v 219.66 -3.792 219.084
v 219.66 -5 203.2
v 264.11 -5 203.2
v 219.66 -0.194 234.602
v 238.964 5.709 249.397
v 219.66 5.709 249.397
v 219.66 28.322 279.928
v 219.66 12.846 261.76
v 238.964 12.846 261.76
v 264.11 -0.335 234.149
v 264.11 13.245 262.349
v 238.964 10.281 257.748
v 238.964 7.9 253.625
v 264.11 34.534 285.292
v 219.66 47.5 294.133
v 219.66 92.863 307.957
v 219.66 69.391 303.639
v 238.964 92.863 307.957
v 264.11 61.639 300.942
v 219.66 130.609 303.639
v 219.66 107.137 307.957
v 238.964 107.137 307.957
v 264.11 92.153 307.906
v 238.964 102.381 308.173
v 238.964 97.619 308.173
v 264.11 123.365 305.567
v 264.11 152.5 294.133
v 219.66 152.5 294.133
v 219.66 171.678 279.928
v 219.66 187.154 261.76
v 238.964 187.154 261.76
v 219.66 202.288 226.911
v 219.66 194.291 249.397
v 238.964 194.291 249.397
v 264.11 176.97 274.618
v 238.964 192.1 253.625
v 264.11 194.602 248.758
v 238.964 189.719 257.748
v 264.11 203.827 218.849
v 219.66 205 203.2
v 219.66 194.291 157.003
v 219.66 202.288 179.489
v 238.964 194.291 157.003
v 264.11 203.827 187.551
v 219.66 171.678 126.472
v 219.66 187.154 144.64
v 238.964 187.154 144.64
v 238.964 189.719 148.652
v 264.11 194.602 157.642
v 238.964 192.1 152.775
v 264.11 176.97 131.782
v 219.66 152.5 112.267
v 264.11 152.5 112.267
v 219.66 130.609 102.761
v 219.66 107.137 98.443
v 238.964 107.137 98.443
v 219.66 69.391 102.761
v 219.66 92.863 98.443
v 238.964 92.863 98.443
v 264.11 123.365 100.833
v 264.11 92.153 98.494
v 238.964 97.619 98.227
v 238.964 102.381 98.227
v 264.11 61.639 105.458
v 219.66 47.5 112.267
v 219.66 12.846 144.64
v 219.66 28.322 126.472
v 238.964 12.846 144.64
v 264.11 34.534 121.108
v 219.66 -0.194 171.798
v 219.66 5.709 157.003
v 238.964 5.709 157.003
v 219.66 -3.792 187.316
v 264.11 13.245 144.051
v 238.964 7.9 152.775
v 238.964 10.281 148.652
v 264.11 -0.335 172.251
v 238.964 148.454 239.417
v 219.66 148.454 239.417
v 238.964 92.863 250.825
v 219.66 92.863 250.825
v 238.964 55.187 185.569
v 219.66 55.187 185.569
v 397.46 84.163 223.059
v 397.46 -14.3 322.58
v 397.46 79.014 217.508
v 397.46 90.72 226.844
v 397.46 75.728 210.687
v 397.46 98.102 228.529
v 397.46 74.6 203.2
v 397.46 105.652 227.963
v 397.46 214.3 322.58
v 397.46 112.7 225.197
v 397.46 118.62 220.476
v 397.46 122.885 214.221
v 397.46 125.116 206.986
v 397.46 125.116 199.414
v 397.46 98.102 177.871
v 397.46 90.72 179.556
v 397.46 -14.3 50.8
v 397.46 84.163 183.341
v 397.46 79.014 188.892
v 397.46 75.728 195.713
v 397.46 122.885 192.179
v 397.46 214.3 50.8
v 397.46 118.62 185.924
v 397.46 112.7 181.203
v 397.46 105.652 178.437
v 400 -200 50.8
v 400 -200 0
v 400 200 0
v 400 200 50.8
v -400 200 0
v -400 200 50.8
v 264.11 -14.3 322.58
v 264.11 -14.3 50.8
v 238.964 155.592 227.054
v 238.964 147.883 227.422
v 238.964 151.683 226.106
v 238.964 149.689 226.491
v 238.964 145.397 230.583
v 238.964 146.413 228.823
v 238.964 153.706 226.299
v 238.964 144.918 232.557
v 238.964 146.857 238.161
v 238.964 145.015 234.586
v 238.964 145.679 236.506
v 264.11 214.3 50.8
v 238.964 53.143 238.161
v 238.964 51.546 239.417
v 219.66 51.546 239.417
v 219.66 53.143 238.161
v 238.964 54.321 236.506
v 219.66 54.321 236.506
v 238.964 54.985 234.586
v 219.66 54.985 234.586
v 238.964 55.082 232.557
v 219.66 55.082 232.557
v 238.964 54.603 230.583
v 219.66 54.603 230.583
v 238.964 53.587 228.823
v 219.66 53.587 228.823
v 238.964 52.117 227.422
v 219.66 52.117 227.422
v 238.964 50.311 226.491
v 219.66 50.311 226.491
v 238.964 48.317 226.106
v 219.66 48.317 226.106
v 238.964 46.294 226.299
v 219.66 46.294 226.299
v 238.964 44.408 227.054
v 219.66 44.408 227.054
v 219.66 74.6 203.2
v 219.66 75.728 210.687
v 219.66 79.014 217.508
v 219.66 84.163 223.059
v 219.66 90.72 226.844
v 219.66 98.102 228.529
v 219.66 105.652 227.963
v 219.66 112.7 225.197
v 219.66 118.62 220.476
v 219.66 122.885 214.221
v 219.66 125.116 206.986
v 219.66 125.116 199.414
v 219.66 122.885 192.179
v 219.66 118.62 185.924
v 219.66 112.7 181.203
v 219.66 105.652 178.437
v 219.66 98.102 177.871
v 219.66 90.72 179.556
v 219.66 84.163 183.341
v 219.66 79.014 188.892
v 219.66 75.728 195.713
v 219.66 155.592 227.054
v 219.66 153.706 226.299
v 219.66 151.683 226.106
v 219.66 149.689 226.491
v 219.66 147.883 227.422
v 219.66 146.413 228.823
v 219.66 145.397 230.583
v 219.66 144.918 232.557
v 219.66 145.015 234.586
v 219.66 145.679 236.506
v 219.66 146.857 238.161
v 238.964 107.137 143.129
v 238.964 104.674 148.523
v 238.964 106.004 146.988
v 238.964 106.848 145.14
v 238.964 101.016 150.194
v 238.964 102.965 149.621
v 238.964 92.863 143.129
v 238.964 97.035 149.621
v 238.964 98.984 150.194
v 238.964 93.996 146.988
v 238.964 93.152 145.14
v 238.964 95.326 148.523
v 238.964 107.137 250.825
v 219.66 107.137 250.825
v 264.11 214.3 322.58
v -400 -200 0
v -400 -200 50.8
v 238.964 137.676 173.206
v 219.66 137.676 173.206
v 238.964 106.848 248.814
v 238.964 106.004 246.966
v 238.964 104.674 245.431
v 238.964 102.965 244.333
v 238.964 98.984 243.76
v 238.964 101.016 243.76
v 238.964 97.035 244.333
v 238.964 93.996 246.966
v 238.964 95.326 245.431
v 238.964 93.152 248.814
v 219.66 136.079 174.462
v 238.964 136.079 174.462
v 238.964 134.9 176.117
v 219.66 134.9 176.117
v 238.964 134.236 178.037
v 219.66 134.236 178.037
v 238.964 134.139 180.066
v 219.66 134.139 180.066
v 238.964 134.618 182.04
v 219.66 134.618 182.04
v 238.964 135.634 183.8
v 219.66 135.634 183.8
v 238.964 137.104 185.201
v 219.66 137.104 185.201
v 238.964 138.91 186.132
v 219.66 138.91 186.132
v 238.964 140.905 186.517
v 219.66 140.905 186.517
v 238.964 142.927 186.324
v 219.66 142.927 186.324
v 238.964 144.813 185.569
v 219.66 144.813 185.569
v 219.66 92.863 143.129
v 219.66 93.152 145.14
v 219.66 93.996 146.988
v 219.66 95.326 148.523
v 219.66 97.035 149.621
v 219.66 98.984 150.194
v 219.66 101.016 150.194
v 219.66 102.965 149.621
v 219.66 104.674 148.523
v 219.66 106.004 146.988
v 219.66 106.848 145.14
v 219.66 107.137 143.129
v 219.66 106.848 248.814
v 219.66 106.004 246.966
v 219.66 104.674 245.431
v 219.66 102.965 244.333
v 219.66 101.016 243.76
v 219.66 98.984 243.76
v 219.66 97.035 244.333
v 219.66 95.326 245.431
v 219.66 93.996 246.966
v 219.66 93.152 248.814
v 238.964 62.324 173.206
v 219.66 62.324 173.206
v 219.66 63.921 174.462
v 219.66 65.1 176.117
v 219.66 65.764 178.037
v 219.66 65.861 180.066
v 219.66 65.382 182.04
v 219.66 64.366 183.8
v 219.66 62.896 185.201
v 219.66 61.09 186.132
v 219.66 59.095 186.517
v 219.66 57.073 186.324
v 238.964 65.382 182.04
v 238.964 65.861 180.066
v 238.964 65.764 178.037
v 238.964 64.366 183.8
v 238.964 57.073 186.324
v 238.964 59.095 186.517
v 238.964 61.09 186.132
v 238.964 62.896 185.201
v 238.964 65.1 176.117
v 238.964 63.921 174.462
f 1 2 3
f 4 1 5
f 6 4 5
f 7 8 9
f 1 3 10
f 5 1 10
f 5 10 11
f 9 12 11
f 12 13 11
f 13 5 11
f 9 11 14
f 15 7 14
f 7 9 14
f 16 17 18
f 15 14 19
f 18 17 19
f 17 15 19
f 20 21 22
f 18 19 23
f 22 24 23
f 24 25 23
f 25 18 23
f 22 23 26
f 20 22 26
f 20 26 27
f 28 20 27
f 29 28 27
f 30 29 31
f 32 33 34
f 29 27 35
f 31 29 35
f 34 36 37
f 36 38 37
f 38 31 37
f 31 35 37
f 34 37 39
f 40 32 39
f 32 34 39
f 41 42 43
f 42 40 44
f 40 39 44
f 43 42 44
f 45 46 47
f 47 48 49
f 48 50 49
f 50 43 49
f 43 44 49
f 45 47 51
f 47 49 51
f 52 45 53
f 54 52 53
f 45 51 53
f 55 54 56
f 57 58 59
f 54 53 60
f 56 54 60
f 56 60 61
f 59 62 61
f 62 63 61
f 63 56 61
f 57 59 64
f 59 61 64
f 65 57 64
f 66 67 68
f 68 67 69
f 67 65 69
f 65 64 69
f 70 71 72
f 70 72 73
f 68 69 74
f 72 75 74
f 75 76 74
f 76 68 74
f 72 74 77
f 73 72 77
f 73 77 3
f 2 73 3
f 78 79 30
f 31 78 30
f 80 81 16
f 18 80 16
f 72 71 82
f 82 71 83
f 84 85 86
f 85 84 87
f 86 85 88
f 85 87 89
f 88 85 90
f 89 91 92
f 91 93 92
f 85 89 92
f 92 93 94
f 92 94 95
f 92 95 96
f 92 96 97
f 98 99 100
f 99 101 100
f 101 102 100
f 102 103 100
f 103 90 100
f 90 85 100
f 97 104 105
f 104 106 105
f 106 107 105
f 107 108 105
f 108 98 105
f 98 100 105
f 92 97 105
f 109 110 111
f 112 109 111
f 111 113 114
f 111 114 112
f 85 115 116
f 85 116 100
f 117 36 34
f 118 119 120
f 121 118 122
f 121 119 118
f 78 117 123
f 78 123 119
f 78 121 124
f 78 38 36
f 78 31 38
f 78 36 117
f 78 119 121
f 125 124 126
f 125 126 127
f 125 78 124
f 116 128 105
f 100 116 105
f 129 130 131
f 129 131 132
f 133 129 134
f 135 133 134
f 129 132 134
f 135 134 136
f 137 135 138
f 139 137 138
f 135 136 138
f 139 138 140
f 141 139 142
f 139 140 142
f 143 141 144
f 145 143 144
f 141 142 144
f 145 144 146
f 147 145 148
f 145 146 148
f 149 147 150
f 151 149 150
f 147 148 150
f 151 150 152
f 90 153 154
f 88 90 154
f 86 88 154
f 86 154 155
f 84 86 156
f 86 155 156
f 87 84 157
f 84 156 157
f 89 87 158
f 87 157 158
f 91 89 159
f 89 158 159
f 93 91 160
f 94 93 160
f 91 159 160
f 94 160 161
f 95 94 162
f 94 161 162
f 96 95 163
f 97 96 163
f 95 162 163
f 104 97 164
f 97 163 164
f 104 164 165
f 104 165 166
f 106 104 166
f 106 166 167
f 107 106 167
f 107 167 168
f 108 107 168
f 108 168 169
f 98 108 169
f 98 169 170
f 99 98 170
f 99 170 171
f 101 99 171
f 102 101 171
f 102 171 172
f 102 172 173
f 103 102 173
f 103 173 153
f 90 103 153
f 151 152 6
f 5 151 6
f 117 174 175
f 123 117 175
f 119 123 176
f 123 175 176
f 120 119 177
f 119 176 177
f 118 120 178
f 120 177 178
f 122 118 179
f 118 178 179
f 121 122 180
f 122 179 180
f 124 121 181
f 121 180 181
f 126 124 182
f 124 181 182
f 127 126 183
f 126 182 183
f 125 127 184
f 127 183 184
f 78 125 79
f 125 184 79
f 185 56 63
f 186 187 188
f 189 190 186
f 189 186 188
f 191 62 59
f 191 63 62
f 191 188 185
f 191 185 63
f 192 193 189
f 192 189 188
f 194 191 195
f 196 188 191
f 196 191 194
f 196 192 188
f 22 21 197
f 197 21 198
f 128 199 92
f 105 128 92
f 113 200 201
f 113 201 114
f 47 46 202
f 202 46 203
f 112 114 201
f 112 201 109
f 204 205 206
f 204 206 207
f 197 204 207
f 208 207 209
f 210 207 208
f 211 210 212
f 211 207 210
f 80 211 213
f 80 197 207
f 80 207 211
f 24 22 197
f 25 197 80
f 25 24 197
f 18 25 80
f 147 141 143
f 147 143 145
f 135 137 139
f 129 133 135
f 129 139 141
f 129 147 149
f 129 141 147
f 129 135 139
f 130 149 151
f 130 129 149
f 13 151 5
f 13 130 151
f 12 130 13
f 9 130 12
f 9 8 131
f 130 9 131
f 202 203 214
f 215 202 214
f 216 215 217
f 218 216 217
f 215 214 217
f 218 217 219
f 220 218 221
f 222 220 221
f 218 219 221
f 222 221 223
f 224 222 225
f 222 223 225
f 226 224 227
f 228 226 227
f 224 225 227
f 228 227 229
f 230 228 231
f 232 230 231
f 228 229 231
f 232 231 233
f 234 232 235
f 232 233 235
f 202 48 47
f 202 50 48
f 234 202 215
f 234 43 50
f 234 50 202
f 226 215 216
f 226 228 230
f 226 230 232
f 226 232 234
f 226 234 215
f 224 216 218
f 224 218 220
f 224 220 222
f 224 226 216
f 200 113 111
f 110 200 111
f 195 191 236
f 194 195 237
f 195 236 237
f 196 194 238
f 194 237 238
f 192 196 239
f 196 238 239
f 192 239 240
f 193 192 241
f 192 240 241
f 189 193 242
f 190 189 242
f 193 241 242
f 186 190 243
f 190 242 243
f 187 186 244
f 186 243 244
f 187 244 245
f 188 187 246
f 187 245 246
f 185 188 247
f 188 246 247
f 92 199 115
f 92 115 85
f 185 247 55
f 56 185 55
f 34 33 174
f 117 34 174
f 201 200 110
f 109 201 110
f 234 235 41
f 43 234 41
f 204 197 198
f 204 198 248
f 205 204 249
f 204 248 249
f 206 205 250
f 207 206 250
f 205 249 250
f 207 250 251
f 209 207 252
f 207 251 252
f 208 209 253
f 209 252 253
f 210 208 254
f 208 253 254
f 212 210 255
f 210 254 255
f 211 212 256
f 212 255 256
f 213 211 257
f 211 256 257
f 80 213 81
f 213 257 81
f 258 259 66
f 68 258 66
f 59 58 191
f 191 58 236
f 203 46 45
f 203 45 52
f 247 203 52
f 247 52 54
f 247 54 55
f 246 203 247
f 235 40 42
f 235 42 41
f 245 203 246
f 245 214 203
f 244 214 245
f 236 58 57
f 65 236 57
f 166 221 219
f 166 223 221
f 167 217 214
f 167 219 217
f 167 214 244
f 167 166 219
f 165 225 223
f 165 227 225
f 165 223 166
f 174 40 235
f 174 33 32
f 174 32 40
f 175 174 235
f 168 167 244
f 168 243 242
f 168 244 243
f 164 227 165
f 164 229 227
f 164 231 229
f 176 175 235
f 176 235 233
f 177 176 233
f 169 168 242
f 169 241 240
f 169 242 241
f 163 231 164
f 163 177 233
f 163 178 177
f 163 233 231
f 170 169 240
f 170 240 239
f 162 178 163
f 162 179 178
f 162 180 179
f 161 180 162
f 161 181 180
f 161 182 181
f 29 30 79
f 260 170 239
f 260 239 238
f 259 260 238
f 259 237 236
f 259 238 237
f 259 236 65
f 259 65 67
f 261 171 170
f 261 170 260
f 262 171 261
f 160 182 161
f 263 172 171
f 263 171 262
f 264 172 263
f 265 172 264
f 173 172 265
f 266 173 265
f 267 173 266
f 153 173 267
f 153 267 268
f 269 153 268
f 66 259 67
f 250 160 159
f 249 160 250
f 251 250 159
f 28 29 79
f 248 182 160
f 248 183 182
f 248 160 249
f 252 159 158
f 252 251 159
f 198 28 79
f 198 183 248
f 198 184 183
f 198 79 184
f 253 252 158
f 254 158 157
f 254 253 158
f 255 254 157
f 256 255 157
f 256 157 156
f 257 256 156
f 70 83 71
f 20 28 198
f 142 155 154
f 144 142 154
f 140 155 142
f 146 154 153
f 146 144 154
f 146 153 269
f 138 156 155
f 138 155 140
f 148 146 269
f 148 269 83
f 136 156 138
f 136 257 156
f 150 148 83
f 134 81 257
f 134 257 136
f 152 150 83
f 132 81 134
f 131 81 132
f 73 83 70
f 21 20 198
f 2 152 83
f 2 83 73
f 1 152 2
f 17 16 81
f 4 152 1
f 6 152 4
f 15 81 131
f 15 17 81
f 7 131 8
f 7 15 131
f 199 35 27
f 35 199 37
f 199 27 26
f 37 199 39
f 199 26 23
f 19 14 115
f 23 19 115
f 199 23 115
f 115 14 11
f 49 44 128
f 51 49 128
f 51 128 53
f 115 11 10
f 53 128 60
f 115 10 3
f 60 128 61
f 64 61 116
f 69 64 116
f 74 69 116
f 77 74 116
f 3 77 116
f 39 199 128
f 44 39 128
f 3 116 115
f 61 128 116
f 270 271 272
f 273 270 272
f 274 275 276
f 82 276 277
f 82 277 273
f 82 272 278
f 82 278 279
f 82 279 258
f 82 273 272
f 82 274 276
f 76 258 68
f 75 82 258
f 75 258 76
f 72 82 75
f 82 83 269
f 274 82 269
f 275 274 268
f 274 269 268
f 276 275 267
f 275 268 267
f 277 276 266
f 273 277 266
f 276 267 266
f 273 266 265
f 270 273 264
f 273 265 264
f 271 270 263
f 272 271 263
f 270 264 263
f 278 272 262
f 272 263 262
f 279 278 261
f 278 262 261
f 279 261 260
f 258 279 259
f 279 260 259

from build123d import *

# Parameters (mm, degrees)
F0_W     = 800
F0_H     = 400
F1_DEPTH = 50.8
F2_W     = 133.35
F2_H     = 14.3
F2_H_2   = 214.3
F3_DEPTH = 271.78
F4_R     = 105
F5_DEPTH = 44.45
F7_DEPTH = 19.304
F8_R     = 25.4
F9_DEPTH = 180.341


with BuildPart() as f1:
    # F0 (on Top) → F1 (new body)
    with BuildSketch(Plane.XY):
        Rectangle(F0_W, F0_H)
    extrude(amount=F1_DEPTH)


with BuildPart() as f3:
    # F2 (on face) → F3 (new body)
    with BuildSketch(Plane.XY.offset(50.8)):
        with Locations((330.785, 207.15)):
            Rectangle(F2_W, F2_H)
        with Locations((330.785, 92.85)):
            Rectangle(F2_W, F2_H_2)
    extrude(amount=F3_DEPTH)

    # F4 (on face) → F5 (join)
    with BuildSketch(Plane(origin=(264.11, 0, 0), x_dir=(0, -1, 0), z_dir=(-1, 0, 0))):
        with Locations((-100, 203.2)):
            Circle(F4_R)
    extrude(amount=F5_DEPTH)

    # F6 (on face) → F7 (cut)
    with BuildSketch(Plane(origin=(219.66, 0, 0), x_dir=(0, -1, 0), z_dir=(-1, 0, 0))):
        with BuildLine():
            Line((-107.1374, 308.2), (-107.1374, 250.825))
            ThreePointArc((-107.1374, 250.825), (-100, 243.6876), (-92.8626, 250.825))
            Line((-92.8626, 250.825), (-92.8626, 308.2))
            ThreePointArc((-92.8626, 308.2), (-100, 315.3374), (-107.1374, 308.2))
        make_face()
        with BuildLine():
            Line((-92.8626, 98.2), (-92.8626, 143.129))
            ThreePointArc((-92.8626, 143.129), (-100, 150.2664), (-107.1374, 143.129))
            Line((-107.1374, 143.129), (-107.1374, 98.2))
            ThreePointArc((-107.1374, 98.2), (-100, 91.0626), (-92.8626, 98.2))
        make_face()
        with BuildLine():
            ThreePointArc((-137.67576, 173.20633), (-135.06329, 182.9562), (-144.81316, 185.56867))
            Line((-144.81316, 185.56867), (-194.501367, 156.88117))
            ThreePointArc((-194.501367, 156.88117), (-197.113837, 147.1313), (-187.363967, 144.51883))
            Line((-187.363967, 144.51883), (-137.67576, 173.20633))
        make_face()
        with BuildLine():
            ThreePointArc((-55.18684, 185.56867), (-64.93671, 182.9562), (-62.32424, 173.20633))
            Line((-62.32424, 173.20633), (-12.636033, 144.51883))
            ThreePointArc((-12.636033, 144.51883), (-2.886163, 147.1313), (-5.498633, 156.88117))
            Line((-5.498633, 156.88117), (-55.18684, 185.56867))
        make_face()
        with BuildLine():
            ThreePointArc((-51.545688, 239.41667), (-54.158158, 229.6668), (-44.408288, 227.05433))
            Line((-44.408288, 227.05433), (-5.498633, 249.51883))
            ThreePointArc((-5.498633, 249.51883), (-2.886163, 259.2687), (-12.636033, 261.88117))
            Line((-12.636033, 261.88117), (-51.545688, 239.41667))
        make_face()
        with BuildLine():
            ThreePointArc((-155.591712, 227.05433), (-145.841842, 229.6668), (-148.454312, 239.41667))
            Line((-148.454312, 239.41667), (-187.363967, 261.88117))
            ThreePointArc((-187.363967, 261.88117), (-197.113837, 259.2687), (-194.501367, 249.51883))
            Line((-194.501367, 249.51883), (-155.591712, 227.05433))
        make_face()
    extrude(amount=-F7_DEPTH, mode=Mode.SUBTRACT)

    # F8 (on face) → F9 (cut, through all)
    with BuildSketch(Plane(origin=(219.66, 0, 0), x_dir=(0, -1, 0), z_dir=(-1, 0, 0))):
        with Locations((-100, 203.2)):
            Circle(F8_R)
    extrude(amount=-F9_DEPTH, mode=Mode.SUBTRACT)


solid = Compound([f1.part, f3.part])
